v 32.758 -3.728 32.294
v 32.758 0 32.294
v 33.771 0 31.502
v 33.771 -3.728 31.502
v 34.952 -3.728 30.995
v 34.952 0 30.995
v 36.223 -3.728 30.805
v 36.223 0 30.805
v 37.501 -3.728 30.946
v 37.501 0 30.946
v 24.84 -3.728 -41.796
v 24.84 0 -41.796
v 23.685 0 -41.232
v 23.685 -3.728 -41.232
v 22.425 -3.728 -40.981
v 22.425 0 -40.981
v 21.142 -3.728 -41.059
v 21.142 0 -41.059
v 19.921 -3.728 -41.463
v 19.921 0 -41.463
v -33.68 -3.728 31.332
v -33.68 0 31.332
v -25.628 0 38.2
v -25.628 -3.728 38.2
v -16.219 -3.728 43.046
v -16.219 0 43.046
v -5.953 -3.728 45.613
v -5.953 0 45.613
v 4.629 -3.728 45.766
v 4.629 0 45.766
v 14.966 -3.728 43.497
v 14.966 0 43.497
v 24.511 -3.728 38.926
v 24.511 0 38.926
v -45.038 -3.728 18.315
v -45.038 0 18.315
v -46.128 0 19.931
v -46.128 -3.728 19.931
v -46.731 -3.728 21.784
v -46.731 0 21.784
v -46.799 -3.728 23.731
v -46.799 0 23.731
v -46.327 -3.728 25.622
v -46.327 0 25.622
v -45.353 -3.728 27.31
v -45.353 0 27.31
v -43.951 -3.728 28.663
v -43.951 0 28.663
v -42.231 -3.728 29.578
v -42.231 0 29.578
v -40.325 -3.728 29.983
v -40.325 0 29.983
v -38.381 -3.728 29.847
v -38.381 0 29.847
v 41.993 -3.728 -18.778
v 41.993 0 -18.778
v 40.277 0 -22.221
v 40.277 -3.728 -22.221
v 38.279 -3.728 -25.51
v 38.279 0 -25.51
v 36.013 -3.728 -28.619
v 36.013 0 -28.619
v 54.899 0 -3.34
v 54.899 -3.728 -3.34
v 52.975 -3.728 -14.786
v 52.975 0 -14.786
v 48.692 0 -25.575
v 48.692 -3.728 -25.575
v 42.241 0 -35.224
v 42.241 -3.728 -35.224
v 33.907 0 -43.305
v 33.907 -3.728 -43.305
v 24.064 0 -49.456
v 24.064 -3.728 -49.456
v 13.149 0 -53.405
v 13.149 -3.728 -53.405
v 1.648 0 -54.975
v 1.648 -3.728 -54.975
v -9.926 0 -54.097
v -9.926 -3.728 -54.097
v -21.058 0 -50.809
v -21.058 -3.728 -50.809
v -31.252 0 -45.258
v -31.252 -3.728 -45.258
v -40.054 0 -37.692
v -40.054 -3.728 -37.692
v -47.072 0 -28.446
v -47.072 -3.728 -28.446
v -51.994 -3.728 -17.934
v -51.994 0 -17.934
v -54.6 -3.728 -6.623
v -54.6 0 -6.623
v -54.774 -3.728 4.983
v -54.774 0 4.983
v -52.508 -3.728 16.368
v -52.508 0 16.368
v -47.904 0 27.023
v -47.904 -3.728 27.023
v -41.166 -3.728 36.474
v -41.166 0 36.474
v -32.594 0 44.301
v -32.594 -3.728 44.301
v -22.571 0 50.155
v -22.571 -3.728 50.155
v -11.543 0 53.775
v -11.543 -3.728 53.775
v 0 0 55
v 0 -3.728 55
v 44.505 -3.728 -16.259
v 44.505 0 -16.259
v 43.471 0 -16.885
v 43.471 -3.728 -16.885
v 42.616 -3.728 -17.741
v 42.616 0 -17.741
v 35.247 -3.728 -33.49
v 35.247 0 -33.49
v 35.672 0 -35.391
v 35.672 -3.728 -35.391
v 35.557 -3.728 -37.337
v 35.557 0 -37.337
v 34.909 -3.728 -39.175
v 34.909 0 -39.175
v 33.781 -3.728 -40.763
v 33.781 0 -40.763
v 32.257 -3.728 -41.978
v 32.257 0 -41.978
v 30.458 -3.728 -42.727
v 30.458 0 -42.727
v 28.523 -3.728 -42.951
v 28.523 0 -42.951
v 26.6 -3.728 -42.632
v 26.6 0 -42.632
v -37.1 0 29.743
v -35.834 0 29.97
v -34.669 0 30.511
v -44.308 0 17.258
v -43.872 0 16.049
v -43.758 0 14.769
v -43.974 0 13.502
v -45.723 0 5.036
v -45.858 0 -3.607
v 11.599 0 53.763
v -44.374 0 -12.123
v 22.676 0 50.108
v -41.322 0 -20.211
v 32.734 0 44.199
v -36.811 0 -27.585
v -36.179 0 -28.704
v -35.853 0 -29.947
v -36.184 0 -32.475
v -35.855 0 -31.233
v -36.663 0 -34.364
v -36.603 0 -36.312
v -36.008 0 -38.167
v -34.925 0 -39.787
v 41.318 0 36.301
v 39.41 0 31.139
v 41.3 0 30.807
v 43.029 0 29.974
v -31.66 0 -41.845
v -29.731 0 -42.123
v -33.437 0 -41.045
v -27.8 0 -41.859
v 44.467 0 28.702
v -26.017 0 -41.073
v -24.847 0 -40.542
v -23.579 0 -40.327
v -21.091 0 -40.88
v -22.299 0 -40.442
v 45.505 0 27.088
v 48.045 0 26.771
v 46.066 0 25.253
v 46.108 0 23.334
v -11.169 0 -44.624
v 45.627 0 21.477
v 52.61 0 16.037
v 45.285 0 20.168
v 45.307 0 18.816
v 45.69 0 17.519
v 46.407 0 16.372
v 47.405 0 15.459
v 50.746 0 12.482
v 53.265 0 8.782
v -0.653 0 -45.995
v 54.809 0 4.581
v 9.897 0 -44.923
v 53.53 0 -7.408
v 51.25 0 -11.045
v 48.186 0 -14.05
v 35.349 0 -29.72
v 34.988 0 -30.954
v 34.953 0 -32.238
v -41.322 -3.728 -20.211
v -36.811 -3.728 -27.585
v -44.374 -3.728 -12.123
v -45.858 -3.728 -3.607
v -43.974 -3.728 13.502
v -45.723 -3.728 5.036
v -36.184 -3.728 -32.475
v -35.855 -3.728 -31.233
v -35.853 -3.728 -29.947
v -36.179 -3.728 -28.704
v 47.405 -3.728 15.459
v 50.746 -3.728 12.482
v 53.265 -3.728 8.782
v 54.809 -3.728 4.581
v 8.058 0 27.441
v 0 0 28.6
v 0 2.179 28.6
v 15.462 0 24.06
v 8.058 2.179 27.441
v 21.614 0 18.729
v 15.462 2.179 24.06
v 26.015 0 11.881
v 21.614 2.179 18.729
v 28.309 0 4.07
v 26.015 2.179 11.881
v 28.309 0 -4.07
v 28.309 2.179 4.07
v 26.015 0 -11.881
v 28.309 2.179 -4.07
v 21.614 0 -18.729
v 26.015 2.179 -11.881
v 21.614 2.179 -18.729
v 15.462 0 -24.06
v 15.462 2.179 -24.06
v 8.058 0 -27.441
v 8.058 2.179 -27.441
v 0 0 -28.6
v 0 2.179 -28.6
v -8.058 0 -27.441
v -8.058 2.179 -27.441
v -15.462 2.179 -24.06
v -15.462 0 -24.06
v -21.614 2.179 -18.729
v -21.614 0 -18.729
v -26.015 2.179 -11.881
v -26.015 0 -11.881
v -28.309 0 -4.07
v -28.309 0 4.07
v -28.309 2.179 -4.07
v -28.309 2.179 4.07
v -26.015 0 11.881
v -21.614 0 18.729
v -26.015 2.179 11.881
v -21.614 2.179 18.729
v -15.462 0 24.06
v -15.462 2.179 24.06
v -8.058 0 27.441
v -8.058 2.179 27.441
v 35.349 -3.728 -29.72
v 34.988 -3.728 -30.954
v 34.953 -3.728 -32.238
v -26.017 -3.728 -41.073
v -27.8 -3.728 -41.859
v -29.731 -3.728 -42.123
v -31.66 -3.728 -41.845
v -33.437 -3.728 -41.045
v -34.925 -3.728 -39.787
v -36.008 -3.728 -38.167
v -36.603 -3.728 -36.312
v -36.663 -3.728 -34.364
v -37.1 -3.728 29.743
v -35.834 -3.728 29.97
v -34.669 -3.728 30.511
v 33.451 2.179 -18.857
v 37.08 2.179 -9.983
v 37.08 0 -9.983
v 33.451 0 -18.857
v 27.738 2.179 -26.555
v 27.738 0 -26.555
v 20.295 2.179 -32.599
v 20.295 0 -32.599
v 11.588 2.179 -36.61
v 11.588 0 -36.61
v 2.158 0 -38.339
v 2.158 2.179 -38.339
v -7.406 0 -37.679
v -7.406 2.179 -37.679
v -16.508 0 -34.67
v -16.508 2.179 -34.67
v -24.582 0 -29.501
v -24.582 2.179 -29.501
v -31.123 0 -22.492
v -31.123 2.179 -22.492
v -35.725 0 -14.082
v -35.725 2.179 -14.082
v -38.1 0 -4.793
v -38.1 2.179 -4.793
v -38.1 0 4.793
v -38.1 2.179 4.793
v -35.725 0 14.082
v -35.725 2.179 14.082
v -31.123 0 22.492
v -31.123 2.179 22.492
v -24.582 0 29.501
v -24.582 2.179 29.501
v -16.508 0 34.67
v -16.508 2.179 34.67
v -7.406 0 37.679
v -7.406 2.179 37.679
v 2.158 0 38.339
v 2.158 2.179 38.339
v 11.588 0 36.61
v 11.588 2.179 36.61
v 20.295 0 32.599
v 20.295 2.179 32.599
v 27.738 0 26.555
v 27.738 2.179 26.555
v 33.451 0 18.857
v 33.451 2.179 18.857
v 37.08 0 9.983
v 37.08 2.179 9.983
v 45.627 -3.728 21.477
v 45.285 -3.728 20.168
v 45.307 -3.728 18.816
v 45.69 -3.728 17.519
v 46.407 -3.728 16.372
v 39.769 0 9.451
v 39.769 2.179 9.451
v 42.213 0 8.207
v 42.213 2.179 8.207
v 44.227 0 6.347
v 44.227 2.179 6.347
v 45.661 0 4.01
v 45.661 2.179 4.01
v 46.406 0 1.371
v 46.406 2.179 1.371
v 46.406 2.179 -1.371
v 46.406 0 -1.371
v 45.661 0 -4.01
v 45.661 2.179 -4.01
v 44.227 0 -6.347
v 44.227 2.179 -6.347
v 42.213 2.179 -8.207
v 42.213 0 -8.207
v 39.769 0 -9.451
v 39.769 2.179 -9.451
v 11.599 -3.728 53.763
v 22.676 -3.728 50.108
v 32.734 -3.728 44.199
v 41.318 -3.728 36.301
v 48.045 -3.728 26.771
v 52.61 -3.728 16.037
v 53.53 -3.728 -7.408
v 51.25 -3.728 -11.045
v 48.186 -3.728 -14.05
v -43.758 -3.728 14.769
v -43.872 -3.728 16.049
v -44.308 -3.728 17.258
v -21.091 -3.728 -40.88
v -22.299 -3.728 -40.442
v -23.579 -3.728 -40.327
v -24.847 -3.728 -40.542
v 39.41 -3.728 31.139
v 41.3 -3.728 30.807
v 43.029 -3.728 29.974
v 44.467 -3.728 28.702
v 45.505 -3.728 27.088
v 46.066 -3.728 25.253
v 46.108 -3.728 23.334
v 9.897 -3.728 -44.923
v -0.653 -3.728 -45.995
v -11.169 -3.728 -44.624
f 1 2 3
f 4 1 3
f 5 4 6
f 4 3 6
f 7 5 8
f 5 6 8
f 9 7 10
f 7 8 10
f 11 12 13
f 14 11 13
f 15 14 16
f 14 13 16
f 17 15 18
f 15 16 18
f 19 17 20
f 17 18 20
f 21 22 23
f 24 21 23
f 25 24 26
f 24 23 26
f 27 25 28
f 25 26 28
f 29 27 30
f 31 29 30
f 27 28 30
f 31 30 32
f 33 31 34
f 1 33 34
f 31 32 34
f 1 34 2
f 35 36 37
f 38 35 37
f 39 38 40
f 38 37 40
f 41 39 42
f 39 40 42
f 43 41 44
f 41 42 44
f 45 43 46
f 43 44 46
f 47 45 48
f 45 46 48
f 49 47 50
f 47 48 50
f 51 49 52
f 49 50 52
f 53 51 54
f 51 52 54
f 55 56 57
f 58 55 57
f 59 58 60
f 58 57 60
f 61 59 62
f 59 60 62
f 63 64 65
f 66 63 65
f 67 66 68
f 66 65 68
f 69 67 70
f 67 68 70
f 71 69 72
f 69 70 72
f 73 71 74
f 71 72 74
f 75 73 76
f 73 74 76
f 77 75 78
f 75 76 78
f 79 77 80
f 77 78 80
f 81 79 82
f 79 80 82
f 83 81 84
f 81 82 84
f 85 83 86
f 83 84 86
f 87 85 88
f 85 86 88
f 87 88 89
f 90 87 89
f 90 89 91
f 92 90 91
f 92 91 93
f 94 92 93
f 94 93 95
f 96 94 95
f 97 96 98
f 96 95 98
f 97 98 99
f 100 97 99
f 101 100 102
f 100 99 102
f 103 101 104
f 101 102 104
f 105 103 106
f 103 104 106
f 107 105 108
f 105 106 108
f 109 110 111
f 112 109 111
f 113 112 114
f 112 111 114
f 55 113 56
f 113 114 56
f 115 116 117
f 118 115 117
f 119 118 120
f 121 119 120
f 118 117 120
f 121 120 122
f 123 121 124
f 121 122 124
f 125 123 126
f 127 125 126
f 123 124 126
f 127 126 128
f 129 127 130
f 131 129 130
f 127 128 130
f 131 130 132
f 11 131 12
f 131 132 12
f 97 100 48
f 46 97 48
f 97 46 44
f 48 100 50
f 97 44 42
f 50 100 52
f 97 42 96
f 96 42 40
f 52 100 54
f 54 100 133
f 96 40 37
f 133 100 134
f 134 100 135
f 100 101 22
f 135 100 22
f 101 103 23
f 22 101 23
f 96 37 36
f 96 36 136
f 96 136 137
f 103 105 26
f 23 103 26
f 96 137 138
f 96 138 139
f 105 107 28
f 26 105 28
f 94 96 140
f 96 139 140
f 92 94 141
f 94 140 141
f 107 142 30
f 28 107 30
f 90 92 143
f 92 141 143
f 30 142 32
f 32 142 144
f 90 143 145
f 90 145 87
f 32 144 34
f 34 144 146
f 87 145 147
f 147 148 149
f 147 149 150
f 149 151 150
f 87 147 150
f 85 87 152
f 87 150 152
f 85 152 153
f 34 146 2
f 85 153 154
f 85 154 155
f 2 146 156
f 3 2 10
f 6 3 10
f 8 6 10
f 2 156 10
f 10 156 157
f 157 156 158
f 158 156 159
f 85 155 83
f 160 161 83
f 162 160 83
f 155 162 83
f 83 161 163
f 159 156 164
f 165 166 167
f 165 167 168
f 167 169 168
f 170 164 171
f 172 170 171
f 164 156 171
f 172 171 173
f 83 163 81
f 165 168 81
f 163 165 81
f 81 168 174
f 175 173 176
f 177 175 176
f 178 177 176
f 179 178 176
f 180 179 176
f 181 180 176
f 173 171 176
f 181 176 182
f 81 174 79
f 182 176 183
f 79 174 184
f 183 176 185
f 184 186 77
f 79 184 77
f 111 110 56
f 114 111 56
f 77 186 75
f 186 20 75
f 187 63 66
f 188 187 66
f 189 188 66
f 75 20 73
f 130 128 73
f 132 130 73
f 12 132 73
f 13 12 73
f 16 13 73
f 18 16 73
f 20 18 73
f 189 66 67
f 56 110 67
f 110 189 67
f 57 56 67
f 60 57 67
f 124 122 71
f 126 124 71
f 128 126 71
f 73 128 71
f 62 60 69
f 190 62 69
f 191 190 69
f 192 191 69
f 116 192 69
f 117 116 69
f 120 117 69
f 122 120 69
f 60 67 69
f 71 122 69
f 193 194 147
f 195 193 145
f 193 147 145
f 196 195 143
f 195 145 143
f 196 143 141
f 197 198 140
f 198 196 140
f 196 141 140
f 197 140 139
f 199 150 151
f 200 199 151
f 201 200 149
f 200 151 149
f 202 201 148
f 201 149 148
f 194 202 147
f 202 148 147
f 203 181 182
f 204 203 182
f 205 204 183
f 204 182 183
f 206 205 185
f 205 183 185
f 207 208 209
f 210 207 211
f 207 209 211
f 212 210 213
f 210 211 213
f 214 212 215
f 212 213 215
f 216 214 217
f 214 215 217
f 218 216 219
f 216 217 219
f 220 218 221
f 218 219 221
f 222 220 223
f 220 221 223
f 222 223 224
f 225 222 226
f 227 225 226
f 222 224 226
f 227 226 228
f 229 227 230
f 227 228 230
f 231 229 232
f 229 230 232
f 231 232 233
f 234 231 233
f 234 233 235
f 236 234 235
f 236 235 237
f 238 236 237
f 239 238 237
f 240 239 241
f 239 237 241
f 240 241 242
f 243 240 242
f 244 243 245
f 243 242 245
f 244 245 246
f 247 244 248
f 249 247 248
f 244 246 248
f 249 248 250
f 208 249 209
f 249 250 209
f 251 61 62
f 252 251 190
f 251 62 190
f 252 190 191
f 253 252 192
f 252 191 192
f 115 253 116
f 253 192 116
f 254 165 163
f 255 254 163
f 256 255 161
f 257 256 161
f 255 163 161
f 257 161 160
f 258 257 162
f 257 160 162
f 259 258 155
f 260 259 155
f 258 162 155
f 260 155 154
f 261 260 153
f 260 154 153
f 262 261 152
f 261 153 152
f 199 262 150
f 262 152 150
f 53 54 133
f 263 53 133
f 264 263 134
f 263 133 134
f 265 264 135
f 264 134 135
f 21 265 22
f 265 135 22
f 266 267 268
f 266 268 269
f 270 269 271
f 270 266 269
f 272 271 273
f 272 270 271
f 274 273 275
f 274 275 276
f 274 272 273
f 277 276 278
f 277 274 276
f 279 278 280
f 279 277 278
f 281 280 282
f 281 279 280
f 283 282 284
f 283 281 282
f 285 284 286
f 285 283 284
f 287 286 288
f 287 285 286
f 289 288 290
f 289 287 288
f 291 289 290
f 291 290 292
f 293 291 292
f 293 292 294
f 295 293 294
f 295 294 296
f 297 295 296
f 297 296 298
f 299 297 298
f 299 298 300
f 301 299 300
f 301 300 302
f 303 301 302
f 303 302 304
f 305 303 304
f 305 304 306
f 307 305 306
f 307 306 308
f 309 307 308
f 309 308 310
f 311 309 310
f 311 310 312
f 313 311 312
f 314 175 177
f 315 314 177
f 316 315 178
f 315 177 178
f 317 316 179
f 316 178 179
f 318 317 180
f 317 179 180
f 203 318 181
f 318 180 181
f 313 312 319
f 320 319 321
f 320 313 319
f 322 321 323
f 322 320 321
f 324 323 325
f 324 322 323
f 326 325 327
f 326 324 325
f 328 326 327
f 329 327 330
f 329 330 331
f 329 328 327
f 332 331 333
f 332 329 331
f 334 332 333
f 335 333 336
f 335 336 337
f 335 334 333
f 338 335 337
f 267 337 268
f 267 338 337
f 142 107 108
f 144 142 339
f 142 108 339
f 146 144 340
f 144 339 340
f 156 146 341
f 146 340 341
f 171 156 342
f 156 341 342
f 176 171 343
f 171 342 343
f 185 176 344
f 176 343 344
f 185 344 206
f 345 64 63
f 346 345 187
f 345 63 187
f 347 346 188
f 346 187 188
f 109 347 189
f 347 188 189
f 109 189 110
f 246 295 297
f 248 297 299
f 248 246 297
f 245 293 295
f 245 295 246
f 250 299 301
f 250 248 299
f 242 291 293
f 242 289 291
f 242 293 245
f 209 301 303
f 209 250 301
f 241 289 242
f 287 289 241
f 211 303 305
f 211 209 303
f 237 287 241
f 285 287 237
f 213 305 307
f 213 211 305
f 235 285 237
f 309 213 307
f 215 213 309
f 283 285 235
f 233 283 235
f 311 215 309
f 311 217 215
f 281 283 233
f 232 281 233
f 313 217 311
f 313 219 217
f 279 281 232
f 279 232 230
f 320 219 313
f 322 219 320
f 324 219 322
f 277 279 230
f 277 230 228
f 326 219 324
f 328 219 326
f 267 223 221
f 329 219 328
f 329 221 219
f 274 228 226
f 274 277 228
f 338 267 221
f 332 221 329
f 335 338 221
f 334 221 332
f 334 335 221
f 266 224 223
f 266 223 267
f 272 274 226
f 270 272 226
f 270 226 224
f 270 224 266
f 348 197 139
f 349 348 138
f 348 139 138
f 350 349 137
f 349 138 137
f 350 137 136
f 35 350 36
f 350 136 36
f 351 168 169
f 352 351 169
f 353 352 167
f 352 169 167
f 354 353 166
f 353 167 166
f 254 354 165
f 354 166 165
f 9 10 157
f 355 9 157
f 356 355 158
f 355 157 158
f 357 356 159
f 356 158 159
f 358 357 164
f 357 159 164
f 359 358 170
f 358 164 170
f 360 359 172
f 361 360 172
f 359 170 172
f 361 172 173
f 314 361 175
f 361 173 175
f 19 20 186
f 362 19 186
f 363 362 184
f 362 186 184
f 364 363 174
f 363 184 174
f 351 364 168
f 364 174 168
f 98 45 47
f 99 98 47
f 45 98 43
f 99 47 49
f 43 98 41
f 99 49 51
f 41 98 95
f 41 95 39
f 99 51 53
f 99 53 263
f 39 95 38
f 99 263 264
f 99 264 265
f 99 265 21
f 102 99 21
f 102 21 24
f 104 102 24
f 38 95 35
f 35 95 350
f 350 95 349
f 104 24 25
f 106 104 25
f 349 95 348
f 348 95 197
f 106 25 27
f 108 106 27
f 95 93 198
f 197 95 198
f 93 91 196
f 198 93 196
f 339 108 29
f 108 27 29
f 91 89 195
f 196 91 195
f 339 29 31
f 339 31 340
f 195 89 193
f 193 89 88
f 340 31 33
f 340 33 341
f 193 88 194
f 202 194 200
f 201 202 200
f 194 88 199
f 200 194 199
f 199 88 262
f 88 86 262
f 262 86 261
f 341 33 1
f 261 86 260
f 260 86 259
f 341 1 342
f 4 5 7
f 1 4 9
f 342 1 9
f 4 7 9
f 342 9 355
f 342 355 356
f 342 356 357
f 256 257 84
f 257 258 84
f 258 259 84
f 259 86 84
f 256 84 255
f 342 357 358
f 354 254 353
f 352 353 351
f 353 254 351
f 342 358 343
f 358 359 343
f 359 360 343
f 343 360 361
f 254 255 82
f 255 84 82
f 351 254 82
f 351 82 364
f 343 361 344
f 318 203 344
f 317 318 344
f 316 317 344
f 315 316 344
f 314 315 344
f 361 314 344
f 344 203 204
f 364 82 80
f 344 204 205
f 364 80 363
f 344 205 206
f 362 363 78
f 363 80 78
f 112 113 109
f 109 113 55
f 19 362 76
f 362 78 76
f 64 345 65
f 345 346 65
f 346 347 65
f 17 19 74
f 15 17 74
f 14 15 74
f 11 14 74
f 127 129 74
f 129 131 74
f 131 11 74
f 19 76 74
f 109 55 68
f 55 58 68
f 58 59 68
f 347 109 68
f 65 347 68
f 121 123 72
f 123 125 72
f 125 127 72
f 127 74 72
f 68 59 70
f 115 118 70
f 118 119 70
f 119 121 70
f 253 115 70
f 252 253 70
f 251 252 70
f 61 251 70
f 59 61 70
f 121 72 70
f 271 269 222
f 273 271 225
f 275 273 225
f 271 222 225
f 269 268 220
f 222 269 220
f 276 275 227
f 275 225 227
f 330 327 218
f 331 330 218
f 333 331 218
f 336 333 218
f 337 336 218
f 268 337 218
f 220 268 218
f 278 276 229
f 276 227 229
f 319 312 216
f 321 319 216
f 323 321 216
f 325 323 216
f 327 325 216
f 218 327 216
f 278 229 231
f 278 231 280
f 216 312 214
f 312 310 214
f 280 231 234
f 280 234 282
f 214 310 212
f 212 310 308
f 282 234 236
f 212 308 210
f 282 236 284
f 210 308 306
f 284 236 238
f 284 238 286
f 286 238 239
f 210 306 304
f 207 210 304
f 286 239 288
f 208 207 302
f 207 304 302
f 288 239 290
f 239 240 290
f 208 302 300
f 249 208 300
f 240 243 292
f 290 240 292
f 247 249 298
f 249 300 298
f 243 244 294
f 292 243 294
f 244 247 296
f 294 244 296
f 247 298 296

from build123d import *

# Parameters (mm, degrees)
F0_W           = 9.5
F0_H           = 9.8
F2_R           = 3.5
F3_DEPTH       = 25
F5_DEPTH       = 10
F7_SIZE        = 2
F8_DEPTH       = 25
F9_R           = 5
F10_DEPTH      = 6
F11_W          = 122.7332167327
F11_H          = 9.202274261
F11_W_2        = 118.1512214243
F11_H_2        = 11.7236196529
F12_DEPTH      = 75.5
F12_DEPTH_BACK = 118.2


# Not quite as in the source:
# - a feature names something its author has since deleted; it is built from what else it names


with BuildPart() as f1:
    # F0 (on Right) → F1 (revolve)
    with BuildSketch(Plane.YZ):
        Polygon((0, 15.2), (0, 28.6), (0, 38.4), (0, 55), (-3, 55), (-8, 55), (-8, 50), (-8, 39), (-8, 24.9987460632), (-8, 15.2), align=None)
        with Locations((4.75, 33.5)):
            Rectangle(F0_W, F0_H)
    revolve(axis=Axis((0, 5.6388881058, 0), (0, 1, 0)))

    # F2 (on face) → F3 (cut)
    with BuildSketch(Plane(origin=(0, 0, 0), x_dir=(-1, 0, 0), z_dir=(0, 1, 0))):
        with Locations((-28.6948903703, -35.9527921953)):
            Circle(F2_R)
        with Locations((39.8371685741, 23)):
            Circle(F2_R)
        with Locations((30.4043578574, -35.1233700587)):
            Circle(F2_R)
        with Locations((-39.5545513391, 23.3937592234)):
            Circle(F2_R)
    extrude(amount=-F3_DEPTH, mode=Mode.SUBTRACT)


with BuildPart() as f5:
    # F4 (on face) → F5 (new body)
    with BuildSketch(Plane(origin=(0, 9.5, 0), x_dir=(-1, 0, 0), z_dir=(0, 1, 0))):
        with BuildLine():
            ThreePointArc((-37.0795890411, -9.9831896979), (-38.4, 0), (-37.0795890411, 9.9831896979))
            ThreePointArc((-37.0795890411, 9.9831896979), (-46.5, 0), (-37.0795890411, -9.9831896979))
        make_face()
    extrude(amount=-F5_DEPTH)


with BuildPart() as f1_1:
    add(f1.part)

    # F6: union F5
    add(f5.part)

    # F7
    f7_edges = [f1_1.edges().sort_by_distance(p)[0] for p in [
        (-38.4, 9.5, 0),
        (46.5, 9.5, 0),
    ]]
    chamfer(f7_edges, length=F7_SIZE)

    # F2 (on face) → F8 (cut)
    with BuildSketch(Plane(origin=(0, 0, 0), x_dir=(-1, 0, 0), z_dir=(0, 1, 0))):
        with BuildLine():
            ThreePointArc((-32.758400191, 32.293764366), (-34.9517475646, 30.9945529981), (-37.5005356453, 30.9455407609))
            ThreePointArc((-37.5005356453, 30.9455407609), (-44.4666515342, 28.7024423136), (-45.6265051805, 21.4765859117))
            ThreePointArc((-45.6265051805, 21.4765859117), (-45.4543437959, 18.1543829003), (-47.4047637825, 15.4594739469))
            ThreePointArc((-47.4047637825, 15.4594739469), (-55.2129137143, -1.2460492891), (-44.5054093348, -16.2590790271))
            ThreePointArc((-44.5054093348, -16.2590790271), (-43.0175767772, -17.2873268137), (-41.9928754074, -18.7776040809))
            ThreePointArc((-41.9928754074, -18.7776040809), (-39.3121130623, -23.886351052), (-36.0129506984, -28.6193532771))
            ThreePointArc((-36.0129506984, -28.6193532771), (-34.9880846428, -30.9535281736), (-35.24718874, -33.4895857334))
            ThreePointArc((-35.24718874, -33.4895857334), (-33.0615041222, -41.4238692685), (-24.8400834669, -41.7957763419))
            ThreePointArc((-24.8400834669, -41.7957763419), (-22.424614561, -40.9807715296), (-19.9212921248, -41.4625387558))
            ThreePointArc((-19.9212921248, -41.4625387558), (0.6532544849, -45.9953612724), (21.0907724926, -40.8800601231))
            ThreePointArc((21.0907724926, -40.8800601231), (23.5794032698, -40.3273940989), (26.017043636, -41.0734720606))
            ThreePointArc((26.017043636, -41.0734720606), (34.224586227, -40.4682307198), (36.1840595318, -32.4750750957))
            ThreePointArc((36.1840595318, -32.4750750957), (35.8530371648, -29.9473988759), (36.8112004323, -27.585059774))
            ThreePointArc((36.8112004323, -27.585059774), (45.3165258085, -7.9001575079), (43.9739461252, 13.5015577685))
            ThreePointArc((43.9739461252, 13.5015577685), (43.8716778697, 16.0487648828), (45.038491918, 18.315319064))
            ThreePointArc((45.038491918, 18.315319064), (45.8993464006, 26.5), (38.3807775469, 29.8468186171))
            ThreePointArc((38.3807775469, 29.8468186171), (35.8344770228, 29.9696051004), (33.6796650808, 31.3317755649))
            ThreePointArc((33.6796650808, 31.3317755649), (0.6659863832, 45.9951786836), (-32.758400191, 32.293764366))
        make_face()
        with Locations((-28.6948903703, -35.9527921953)):
            Circle(F2_R, mode=Mode.SUBTRACT)
        with Locations((30.4043578574, -35.1233700587)):
            Circle(F2_R, mode=Mode.SUBTRACT)
        with Locations((-39.5545513391, 23.3937592234)):
            Circle(F2_R, mode=Mode.SUBTRACT)
        with Locations((39.8371685741, 23)):
            Circle(F2_R, mode=Mode.SUBTRACT)
    extrude(amount=-F8_DEPTH, mode=Mode.SUBTRACT)

    # F9 (on face) → F10 (cut)
    with BuildSketch(Plane.XZ.offset(8)):
        with Locations((-39.8371685741, 23)):
            Circle(F9_R)
        with Locations((28.6948903703, -35.9527921953)):
            Circle(F9_R)
    extrude(amount=-F10_DEPTH, mode=Mode.SUBTRACT)

    # F11 (on Top) → F12 (cut, two sides)
    with BuildSketch(Plane.XY) as f12_sk:
        with Locations((2.4499390274, -8.3294190699)):
            Rectangle(F11_W, F11_H)
        with Locations((1.2021679431, 8.0409679795)):
            Rectangle(F11_W_2, F11_H_2)
    extrude(amount=-F12_DEPTH, mode=Mode.SUBTRACT)
    extrude(f12_sk.sketch, amount=F12_DEPTH_BACK, mode=Mode.SUBTRACT)


solid = f1_1.part
